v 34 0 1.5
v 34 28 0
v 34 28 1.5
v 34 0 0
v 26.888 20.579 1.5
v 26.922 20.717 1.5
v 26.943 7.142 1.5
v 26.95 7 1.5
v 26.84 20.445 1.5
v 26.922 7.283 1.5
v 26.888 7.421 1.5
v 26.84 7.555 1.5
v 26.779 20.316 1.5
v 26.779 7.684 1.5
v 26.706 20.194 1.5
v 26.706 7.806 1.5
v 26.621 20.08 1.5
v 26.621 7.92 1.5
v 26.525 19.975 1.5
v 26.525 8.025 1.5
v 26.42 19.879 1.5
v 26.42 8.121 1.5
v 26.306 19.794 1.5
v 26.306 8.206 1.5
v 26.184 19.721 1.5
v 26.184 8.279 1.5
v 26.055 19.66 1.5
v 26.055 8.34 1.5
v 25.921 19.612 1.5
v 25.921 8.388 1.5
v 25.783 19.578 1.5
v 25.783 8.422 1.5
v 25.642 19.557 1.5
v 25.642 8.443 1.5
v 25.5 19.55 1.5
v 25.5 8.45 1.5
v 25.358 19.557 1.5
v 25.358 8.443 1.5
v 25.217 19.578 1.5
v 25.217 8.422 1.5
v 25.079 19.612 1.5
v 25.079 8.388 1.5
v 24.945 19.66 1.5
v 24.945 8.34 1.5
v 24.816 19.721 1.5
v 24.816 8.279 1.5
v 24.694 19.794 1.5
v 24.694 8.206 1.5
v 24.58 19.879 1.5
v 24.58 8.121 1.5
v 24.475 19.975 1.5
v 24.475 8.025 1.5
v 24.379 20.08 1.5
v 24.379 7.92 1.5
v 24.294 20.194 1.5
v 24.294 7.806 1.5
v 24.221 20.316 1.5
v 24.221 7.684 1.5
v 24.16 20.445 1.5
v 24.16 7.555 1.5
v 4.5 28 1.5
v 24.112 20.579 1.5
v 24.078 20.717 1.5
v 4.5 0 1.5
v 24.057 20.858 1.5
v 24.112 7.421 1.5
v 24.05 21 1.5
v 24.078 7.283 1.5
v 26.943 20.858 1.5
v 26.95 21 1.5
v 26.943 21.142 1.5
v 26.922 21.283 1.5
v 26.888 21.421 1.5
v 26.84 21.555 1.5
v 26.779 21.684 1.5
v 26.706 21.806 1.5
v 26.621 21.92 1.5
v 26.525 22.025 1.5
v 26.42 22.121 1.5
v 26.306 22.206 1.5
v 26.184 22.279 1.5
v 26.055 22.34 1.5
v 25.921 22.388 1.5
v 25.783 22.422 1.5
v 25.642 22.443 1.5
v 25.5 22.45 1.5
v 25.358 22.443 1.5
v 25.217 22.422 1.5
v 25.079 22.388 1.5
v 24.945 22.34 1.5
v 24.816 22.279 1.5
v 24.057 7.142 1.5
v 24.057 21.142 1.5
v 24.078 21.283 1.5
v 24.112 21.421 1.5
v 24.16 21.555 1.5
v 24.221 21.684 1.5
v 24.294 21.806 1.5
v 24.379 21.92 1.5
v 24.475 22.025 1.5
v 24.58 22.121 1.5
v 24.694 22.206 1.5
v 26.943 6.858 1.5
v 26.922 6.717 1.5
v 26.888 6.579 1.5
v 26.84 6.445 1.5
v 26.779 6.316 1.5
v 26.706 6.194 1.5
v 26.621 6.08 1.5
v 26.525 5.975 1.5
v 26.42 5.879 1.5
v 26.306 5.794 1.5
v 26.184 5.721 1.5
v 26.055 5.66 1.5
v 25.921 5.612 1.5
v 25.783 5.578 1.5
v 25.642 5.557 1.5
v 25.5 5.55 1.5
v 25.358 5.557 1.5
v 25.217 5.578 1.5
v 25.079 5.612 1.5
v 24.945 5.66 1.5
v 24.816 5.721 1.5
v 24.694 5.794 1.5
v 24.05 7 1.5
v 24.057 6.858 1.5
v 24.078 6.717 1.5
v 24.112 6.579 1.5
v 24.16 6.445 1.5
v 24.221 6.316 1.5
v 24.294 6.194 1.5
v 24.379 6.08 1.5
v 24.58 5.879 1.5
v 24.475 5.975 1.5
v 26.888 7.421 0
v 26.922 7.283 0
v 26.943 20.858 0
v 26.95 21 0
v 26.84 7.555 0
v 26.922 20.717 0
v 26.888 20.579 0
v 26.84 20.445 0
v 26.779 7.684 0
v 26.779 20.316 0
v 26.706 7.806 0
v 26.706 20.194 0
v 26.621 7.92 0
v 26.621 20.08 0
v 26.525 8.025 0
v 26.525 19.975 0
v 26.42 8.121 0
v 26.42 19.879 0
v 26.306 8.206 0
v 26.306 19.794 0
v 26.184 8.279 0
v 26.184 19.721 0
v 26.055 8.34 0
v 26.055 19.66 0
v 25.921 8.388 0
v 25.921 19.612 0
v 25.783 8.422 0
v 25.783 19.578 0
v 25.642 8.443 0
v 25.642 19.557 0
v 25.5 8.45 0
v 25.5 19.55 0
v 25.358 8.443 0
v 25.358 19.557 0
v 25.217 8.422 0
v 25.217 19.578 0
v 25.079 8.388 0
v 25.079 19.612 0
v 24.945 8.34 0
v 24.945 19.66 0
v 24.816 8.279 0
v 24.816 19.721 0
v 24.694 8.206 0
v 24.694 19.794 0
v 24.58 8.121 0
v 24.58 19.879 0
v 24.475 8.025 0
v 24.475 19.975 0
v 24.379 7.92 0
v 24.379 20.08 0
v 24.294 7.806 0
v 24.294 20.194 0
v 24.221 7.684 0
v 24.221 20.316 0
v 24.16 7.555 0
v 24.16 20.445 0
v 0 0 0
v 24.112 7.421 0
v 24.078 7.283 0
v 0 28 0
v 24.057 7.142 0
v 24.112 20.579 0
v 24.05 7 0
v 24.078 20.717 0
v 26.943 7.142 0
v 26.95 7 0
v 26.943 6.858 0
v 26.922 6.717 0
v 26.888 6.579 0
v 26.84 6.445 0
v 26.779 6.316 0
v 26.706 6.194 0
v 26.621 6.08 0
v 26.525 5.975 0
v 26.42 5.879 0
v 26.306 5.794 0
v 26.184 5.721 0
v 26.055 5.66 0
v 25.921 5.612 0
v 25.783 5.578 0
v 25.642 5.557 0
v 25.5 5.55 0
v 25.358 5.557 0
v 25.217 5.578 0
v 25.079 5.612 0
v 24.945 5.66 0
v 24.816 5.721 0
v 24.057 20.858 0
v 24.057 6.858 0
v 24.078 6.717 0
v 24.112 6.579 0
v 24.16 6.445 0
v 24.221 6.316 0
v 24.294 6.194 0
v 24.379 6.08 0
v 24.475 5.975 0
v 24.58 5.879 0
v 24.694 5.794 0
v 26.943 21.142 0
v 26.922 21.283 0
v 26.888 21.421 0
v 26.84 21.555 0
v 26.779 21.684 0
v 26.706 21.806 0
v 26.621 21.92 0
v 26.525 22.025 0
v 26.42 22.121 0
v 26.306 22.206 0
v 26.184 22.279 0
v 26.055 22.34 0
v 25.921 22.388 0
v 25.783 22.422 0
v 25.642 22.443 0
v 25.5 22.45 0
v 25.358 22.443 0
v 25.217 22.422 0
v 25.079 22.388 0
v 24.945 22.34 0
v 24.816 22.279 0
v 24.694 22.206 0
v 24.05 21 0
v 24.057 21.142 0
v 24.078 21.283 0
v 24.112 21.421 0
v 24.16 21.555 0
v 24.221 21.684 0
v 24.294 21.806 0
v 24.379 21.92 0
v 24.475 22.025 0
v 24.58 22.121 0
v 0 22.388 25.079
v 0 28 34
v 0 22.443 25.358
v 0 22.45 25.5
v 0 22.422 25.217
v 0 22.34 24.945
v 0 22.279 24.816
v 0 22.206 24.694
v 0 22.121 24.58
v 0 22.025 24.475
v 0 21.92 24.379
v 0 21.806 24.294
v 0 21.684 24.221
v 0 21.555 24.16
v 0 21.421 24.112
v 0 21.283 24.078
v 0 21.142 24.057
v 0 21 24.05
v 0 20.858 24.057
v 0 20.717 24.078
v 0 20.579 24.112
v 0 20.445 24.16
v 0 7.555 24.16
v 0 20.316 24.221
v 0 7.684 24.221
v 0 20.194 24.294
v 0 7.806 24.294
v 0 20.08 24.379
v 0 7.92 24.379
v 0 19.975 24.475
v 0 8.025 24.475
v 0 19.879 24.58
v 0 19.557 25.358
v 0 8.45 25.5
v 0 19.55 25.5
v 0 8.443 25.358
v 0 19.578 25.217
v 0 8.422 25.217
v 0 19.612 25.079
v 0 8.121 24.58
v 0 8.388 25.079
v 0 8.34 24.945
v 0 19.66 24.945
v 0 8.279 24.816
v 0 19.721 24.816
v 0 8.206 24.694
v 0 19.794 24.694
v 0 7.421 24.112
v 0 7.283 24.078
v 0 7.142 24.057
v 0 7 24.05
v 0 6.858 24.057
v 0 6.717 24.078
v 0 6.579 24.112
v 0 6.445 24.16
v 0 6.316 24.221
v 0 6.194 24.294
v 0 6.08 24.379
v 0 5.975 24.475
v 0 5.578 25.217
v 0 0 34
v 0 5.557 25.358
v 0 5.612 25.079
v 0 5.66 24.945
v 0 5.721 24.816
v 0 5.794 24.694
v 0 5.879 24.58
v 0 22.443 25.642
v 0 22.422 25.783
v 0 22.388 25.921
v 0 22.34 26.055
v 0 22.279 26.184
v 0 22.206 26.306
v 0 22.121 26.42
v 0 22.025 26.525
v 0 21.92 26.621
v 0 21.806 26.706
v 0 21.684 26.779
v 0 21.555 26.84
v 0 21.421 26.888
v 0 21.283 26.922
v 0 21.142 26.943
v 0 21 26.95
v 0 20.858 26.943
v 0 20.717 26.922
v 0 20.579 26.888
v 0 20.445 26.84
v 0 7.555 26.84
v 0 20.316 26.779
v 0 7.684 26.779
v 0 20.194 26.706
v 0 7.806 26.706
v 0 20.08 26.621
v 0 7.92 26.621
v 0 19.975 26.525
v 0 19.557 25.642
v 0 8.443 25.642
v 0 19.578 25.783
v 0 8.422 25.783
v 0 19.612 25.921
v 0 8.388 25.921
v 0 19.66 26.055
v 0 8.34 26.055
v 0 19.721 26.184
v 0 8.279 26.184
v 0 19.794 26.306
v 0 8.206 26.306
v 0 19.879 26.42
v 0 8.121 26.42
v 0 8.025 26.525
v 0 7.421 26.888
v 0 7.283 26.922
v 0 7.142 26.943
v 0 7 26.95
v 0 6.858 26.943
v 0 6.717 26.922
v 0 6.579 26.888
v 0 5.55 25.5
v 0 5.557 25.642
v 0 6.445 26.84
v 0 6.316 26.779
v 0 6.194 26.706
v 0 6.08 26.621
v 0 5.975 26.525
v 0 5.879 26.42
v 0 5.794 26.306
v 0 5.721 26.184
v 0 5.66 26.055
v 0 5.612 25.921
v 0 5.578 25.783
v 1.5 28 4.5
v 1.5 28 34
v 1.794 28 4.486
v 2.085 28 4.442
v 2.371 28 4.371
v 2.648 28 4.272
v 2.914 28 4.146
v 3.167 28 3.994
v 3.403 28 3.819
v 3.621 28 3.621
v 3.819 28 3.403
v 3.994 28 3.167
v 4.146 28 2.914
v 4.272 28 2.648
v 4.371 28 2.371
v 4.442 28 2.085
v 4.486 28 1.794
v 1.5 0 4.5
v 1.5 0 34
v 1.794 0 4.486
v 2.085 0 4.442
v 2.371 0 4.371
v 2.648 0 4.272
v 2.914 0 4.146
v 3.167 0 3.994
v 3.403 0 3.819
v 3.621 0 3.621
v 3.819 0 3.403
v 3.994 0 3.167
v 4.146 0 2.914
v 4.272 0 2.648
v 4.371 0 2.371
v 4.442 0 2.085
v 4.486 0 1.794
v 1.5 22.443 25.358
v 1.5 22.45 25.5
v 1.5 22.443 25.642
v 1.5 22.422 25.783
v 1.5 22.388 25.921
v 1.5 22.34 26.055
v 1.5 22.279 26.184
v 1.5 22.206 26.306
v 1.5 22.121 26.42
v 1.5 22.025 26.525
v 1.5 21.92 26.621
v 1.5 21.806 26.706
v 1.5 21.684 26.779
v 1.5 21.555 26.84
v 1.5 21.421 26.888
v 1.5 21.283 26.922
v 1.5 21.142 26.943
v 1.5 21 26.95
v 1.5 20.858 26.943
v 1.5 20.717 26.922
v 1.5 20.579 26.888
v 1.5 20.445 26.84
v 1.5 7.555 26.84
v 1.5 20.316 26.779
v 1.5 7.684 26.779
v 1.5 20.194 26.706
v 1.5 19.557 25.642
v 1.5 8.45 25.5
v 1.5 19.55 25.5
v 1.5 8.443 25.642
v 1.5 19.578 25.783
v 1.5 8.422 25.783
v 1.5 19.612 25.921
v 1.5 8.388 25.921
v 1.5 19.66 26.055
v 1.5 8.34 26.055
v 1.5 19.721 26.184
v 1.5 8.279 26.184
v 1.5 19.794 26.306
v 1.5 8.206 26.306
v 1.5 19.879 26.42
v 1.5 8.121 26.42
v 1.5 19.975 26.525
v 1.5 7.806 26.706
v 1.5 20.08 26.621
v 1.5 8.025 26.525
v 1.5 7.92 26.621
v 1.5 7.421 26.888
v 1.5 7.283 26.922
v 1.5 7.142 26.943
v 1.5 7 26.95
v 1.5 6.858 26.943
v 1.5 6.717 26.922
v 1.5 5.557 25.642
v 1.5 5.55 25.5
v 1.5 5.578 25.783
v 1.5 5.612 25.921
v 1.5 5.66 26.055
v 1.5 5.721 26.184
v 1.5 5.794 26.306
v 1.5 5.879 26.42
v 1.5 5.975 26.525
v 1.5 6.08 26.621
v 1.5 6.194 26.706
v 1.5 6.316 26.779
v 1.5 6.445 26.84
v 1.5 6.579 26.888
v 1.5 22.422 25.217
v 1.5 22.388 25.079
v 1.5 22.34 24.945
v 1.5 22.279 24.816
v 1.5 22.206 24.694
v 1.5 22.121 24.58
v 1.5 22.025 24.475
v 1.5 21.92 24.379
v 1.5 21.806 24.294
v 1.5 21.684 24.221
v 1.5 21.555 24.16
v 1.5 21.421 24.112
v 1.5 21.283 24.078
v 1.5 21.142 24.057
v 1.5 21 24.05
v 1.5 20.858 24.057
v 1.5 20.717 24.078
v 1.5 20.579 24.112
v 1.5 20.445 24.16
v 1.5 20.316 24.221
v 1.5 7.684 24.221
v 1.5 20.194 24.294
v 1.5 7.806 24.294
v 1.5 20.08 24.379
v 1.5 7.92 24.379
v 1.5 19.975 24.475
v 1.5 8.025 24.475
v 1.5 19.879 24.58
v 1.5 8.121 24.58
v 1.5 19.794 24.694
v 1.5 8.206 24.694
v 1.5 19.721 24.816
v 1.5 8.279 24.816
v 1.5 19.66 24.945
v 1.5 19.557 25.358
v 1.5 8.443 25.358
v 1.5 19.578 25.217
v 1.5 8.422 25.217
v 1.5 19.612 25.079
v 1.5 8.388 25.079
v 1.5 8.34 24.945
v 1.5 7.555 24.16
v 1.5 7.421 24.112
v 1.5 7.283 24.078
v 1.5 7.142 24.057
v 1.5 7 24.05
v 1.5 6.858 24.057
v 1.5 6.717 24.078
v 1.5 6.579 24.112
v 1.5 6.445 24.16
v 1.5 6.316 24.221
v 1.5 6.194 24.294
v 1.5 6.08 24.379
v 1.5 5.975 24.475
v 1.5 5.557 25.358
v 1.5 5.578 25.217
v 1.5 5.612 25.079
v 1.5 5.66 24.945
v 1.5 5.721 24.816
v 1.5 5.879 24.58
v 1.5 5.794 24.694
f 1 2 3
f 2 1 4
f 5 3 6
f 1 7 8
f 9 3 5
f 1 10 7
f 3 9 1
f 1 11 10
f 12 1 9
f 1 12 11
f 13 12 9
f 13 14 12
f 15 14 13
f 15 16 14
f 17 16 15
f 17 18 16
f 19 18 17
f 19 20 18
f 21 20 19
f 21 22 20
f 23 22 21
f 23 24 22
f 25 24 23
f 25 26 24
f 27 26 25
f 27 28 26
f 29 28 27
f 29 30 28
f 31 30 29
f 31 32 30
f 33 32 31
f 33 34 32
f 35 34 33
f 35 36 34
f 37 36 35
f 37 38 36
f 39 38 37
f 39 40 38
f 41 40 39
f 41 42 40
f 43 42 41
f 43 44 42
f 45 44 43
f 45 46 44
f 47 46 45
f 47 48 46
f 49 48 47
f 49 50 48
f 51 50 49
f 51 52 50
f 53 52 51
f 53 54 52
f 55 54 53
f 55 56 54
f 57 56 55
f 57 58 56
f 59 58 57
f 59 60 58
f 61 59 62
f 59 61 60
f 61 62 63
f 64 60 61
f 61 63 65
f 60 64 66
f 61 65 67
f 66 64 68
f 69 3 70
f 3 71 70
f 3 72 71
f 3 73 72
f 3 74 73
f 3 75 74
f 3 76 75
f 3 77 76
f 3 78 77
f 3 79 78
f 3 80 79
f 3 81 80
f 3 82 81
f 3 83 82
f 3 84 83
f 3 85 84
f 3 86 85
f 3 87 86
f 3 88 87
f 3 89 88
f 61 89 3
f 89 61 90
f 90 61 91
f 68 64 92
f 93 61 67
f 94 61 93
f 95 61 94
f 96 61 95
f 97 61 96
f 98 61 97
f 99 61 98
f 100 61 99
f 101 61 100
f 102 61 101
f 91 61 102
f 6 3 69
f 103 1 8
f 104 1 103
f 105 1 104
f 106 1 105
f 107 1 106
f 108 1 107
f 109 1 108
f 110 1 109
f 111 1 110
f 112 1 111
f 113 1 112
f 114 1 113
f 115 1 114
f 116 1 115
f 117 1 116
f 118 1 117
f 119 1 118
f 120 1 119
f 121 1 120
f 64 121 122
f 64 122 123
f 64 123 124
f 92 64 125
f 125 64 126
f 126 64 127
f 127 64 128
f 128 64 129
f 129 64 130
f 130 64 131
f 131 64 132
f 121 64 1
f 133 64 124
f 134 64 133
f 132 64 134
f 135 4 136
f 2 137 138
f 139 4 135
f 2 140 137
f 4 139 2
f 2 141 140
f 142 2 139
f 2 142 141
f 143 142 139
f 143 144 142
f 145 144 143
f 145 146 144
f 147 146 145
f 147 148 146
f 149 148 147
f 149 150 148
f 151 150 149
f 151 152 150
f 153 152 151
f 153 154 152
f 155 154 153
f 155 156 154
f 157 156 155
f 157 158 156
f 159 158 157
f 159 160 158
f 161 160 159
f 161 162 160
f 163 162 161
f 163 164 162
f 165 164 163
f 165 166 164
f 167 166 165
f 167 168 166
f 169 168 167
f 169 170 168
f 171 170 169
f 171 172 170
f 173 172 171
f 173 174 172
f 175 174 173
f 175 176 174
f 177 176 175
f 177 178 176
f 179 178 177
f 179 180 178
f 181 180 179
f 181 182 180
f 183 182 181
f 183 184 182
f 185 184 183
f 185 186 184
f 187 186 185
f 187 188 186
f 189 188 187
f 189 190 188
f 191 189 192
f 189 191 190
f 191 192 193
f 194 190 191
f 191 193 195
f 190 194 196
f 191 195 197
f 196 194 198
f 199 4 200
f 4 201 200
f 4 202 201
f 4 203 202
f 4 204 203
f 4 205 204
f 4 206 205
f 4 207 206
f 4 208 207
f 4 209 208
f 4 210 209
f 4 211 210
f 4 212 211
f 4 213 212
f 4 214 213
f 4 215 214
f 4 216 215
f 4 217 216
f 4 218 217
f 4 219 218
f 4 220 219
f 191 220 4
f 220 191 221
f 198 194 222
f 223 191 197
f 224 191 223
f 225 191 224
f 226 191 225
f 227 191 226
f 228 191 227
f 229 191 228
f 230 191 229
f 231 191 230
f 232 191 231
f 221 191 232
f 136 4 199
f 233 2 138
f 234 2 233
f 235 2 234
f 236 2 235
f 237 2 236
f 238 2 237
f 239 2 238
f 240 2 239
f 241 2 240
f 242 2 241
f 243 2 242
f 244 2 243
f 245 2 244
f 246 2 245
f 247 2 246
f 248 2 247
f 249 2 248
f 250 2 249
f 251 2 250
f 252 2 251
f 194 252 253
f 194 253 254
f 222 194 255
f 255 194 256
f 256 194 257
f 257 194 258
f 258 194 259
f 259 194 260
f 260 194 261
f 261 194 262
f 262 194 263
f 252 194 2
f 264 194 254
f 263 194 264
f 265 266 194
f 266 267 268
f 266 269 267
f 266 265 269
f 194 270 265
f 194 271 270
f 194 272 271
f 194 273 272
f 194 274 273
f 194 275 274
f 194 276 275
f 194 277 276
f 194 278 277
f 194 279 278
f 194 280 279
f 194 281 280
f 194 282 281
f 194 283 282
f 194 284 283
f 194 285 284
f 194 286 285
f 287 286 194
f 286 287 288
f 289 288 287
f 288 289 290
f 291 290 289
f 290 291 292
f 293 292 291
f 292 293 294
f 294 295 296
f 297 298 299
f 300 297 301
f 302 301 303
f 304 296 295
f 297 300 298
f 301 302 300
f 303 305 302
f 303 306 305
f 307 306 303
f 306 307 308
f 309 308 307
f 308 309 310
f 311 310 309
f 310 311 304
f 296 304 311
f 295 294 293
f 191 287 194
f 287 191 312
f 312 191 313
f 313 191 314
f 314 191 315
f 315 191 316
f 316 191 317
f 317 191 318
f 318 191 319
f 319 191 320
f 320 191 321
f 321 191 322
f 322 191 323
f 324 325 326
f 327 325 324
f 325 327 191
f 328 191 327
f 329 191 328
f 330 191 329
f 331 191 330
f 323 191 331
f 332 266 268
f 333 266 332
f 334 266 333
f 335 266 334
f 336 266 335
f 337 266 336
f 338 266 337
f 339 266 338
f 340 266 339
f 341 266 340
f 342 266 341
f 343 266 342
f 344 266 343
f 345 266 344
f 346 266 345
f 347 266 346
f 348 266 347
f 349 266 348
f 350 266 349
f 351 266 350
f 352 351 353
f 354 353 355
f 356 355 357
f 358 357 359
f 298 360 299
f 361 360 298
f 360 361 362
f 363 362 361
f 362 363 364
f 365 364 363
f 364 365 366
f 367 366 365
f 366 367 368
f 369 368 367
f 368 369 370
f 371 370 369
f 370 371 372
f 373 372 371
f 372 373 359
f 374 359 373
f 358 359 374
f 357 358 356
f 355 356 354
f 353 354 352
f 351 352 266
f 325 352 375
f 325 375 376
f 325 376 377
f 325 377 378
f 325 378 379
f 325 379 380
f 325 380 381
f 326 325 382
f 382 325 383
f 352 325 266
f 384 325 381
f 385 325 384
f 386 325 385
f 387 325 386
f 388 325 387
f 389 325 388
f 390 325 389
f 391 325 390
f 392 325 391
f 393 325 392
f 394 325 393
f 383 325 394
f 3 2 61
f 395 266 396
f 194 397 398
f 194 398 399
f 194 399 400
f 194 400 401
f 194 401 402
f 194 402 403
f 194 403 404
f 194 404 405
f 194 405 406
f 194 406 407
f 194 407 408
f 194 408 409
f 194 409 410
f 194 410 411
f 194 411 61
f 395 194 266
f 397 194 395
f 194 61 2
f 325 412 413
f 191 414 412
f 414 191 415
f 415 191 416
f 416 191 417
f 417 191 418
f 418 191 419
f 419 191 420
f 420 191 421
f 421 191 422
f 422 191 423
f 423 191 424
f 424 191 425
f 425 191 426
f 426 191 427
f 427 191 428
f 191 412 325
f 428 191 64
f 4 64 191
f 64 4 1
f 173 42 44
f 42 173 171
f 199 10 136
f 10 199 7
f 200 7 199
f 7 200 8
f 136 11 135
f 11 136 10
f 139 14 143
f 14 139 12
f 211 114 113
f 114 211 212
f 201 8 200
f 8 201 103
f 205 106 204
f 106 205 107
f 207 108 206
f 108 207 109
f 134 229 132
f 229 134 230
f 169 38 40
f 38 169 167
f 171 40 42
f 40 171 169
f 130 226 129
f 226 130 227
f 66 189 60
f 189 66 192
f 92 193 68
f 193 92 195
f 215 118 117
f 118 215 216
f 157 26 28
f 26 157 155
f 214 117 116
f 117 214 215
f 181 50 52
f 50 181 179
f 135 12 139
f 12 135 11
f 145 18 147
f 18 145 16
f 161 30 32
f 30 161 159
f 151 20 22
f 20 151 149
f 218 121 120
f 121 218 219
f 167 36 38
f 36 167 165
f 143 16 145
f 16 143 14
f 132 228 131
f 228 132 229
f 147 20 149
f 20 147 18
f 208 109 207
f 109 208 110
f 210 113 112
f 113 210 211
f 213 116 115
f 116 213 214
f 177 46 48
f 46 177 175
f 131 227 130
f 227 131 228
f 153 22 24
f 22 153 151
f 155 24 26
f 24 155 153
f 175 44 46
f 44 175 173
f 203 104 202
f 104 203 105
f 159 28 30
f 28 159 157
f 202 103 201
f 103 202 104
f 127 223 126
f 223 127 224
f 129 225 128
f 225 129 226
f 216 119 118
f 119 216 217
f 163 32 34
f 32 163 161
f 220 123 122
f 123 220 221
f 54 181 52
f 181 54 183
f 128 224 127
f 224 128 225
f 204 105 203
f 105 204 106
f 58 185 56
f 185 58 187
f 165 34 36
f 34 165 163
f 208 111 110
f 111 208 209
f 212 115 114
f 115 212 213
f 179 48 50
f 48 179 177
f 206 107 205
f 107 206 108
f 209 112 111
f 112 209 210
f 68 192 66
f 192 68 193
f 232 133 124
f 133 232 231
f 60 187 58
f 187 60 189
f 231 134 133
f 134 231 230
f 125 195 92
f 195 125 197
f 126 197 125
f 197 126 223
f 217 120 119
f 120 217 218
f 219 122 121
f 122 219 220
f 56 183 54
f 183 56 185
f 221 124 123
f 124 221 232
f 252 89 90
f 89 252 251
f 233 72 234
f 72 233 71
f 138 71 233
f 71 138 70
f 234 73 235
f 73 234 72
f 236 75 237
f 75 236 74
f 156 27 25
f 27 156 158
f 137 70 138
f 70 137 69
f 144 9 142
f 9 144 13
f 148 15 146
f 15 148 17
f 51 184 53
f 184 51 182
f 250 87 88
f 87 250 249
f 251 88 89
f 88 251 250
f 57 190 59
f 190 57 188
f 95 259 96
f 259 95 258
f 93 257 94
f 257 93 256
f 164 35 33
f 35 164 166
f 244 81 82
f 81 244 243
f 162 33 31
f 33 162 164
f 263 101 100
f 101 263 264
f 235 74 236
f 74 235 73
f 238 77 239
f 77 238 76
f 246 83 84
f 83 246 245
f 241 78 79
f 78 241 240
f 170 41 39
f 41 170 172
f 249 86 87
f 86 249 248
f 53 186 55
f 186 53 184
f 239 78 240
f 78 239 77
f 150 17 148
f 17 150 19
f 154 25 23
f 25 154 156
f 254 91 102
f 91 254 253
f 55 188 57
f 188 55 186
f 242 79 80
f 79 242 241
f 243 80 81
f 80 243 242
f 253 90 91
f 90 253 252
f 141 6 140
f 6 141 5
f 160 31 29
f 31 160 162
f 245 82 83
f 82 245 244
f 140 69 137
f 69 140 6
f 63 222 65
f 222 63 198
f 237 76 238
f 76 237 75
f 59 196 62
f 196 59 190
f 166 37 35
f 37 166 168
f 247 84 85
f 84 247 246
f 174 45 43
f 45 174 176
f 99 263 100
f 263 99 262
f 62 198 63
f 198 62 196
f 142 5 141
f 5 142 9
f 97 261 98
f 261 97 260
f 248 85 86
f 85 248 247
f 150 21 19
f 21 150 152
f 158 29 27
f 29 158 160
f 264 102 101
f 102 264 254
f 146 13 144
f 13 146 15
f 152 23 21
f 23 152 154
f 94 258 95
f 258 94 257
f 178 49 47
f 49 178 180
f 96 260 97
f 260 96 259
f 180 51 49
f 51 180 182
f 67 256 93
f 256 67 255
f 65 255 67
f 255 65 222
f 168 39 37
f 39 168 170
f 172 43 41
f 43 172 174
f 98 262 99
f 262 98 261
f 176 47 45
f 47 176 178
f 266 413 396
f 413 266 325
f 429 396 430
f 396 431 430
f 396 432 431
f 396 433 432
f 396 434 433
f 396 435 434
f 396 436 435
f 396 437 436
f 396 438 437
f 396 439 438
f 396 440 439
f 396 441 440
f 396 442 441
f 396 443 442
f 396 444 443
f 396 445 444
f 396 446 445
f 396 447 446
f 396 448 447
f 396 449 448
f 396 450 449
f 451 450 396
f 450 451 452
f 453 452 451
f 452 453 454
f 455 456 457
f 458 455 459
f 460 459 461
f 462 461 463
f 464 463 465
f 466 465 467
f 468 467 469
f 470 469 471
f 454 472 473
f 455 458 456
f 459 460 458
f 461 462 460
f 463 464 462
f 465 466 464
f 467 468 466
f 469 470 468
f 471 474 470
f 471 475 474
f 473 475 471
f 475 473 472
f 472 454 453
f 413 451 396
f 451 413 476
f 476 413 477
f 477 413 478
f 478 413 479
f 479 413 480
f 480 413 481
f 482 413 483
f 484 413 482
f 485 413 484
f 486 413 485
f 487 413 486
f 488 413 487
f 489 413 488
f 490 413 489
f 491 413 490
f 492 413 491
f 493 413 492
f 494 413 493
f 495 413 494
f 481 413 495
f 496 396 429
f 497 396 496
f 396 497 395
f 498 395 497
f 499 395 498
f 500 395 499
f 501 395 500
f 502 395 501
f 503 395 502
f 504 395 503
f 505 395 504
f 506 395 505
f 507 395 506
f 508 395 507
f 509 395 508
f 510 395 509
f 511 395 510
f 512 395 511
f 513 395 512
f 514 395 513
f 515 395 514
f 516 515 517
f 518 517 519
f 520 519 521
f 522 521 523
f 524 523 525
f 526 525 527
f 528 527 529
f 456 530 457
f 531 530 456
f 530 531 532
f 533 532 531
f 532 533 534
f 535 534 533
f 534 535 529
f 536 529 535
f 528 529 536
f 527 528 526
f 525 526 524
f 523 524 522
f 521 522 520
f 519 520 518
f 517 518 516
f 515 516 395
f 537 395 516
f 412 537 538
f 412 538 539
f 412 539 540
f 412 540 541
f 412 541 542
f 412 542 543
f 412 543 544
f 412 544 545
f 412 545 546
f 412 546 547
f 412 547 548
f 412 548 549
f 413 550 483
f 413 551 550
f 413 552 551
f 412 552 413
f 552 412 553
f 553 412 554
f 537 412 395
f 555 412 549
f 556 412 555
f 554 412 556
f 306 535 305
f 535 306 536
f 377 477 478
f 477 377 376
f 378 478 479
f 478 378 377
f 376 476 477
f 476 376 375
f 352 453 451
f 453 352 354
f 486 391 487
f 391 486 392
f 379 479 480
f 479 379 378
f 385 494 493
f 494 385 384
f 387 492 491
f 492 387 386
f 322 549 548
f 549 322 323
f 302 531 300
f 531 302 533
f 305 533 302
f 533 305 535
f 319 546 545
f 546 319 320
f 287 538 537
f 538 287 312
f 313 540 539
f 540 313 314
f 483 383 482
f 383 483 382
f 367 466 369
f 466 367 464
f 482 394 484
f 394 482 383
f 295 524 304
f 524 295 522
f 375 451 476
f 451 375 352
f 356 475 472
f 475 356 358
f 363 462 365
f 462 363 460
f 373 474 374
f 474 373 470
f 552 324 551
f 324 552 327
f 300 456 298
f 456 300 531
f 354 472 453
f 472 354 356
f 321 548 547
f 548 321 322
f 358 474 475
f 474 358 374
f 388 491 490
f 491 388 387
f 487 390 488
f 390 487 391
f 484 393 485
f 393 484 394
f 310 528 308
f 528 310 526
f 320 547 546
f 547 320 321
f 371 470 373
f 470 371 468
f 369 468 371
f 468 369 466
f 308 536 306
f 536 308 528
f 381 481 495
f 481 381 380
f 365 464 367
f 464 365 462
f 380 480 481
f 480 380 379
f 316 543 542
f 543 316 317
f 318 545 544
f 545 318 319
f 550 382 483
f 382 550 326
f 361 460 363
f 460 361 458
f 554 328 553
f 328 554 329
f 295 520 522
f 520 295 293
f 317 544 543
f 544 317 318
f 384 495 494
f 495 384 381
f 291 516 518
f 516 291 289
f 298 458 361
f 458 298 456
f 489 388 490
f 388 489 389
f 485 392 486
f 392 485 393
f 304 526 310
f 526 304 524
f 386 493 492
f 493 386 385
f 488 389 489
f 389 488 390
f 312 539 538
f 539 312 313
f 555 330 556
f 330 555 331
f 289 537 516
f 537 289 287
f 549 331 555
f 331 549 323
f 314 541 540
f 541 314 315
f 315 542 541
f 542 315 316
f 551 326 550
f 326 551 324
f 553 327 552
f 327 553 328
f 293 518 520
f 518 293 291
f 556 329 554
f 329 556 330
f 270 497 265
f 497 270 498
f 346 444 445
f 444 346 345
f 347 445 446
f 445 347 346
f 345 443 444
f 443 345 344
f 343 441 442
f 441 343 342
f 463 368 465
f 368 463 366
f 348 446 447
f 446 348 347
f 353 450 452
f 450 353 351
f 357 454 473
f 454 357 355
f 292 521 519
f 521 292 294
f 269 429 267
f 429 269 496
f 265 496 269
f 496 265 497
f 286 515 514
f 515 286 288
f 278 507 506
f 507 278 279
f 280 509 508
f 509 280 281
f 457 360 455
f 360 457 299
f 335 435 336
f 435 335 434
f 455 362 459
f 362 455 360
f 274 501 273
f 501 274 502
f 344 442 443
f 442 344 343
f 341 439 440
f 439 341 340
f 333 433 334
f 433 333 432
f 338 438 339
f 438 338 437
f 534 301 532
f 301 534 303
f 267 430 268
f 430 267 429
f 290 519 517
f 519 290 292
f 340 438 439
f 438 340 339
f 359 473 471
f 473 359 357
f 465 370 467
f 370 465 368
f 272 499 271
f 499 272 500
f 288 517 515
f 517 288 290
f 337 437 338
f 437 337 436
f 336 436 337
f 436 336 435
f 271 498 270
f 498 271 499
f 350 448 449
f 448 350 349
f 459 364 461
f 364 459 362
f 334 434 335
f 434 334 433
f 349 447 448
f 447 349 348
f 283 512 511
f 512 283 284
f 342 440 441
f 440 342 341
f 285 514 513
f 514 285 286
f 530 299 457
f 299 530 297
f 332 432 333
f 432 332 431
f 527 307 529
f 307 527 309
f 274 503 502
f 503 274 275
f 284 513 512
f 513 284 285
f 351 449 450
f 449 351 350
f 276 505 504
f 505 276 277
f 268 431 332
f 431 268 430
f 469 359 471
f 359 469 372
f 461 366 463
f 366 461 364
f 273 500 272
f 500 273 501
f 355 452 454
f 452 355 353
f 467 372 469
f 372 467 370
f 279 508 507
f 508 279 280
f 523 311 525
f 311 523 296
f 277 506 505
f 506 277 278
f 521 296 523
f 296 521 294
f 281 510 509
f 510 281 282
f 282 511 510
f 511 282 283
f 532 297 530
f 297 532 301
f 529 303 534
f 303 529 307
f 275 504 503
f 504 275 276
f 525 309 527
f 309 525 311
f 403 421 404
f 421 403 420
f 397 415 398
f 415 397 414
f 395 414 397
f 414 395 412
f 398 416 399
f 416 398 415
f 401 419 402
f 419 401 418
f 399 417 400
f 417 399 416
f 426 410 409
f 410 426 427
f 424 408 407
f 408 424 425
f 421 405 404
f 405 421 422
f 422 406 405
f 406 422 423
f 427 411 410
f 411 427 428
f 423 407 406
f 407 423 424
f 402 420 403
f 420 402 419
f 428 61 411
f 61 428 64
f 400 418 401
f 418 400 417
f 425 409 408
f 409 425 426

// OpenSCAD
module Architrave(l, r, fn=64)
{
    intersection()
    {
        cylinder(h = l, r = r, $fn=fn);
        cube([r, r, l]);
    }
}

module BracketFace(l, w, h, screwDiameter, fn=64)
{
    difference()
    {
        cube([l, w, h]);

        translate([l * 3 / 4, w * 1 / 4, -h])
        cylinder(h = h * 3, r = screwDiameter / 2, $fn=fn);

        translate([l * 3 / 4, w * 3 / 4, -h])
        cylinder(h = h * 3, r = screwDiameter / 2, $fn=fn);
    }
}

module RightAngleBracket(len1 = 34, len2 = 34, w = 28, h = 1.5, support = 3, screwDiameter = 2.9)
{
    BracketFace(len1, w, h, screwDiameter);

    rotate([0, 270, 0])
    translate([0, 0, -h])
    BracketFace(len2, w, h, screwDiameter);

    if (support > 0)
    {
        rotate([270, 270, 0])
        translate([h, h, 0])
        Architrave(w, support);
    }
}

RightAngleBracket();
